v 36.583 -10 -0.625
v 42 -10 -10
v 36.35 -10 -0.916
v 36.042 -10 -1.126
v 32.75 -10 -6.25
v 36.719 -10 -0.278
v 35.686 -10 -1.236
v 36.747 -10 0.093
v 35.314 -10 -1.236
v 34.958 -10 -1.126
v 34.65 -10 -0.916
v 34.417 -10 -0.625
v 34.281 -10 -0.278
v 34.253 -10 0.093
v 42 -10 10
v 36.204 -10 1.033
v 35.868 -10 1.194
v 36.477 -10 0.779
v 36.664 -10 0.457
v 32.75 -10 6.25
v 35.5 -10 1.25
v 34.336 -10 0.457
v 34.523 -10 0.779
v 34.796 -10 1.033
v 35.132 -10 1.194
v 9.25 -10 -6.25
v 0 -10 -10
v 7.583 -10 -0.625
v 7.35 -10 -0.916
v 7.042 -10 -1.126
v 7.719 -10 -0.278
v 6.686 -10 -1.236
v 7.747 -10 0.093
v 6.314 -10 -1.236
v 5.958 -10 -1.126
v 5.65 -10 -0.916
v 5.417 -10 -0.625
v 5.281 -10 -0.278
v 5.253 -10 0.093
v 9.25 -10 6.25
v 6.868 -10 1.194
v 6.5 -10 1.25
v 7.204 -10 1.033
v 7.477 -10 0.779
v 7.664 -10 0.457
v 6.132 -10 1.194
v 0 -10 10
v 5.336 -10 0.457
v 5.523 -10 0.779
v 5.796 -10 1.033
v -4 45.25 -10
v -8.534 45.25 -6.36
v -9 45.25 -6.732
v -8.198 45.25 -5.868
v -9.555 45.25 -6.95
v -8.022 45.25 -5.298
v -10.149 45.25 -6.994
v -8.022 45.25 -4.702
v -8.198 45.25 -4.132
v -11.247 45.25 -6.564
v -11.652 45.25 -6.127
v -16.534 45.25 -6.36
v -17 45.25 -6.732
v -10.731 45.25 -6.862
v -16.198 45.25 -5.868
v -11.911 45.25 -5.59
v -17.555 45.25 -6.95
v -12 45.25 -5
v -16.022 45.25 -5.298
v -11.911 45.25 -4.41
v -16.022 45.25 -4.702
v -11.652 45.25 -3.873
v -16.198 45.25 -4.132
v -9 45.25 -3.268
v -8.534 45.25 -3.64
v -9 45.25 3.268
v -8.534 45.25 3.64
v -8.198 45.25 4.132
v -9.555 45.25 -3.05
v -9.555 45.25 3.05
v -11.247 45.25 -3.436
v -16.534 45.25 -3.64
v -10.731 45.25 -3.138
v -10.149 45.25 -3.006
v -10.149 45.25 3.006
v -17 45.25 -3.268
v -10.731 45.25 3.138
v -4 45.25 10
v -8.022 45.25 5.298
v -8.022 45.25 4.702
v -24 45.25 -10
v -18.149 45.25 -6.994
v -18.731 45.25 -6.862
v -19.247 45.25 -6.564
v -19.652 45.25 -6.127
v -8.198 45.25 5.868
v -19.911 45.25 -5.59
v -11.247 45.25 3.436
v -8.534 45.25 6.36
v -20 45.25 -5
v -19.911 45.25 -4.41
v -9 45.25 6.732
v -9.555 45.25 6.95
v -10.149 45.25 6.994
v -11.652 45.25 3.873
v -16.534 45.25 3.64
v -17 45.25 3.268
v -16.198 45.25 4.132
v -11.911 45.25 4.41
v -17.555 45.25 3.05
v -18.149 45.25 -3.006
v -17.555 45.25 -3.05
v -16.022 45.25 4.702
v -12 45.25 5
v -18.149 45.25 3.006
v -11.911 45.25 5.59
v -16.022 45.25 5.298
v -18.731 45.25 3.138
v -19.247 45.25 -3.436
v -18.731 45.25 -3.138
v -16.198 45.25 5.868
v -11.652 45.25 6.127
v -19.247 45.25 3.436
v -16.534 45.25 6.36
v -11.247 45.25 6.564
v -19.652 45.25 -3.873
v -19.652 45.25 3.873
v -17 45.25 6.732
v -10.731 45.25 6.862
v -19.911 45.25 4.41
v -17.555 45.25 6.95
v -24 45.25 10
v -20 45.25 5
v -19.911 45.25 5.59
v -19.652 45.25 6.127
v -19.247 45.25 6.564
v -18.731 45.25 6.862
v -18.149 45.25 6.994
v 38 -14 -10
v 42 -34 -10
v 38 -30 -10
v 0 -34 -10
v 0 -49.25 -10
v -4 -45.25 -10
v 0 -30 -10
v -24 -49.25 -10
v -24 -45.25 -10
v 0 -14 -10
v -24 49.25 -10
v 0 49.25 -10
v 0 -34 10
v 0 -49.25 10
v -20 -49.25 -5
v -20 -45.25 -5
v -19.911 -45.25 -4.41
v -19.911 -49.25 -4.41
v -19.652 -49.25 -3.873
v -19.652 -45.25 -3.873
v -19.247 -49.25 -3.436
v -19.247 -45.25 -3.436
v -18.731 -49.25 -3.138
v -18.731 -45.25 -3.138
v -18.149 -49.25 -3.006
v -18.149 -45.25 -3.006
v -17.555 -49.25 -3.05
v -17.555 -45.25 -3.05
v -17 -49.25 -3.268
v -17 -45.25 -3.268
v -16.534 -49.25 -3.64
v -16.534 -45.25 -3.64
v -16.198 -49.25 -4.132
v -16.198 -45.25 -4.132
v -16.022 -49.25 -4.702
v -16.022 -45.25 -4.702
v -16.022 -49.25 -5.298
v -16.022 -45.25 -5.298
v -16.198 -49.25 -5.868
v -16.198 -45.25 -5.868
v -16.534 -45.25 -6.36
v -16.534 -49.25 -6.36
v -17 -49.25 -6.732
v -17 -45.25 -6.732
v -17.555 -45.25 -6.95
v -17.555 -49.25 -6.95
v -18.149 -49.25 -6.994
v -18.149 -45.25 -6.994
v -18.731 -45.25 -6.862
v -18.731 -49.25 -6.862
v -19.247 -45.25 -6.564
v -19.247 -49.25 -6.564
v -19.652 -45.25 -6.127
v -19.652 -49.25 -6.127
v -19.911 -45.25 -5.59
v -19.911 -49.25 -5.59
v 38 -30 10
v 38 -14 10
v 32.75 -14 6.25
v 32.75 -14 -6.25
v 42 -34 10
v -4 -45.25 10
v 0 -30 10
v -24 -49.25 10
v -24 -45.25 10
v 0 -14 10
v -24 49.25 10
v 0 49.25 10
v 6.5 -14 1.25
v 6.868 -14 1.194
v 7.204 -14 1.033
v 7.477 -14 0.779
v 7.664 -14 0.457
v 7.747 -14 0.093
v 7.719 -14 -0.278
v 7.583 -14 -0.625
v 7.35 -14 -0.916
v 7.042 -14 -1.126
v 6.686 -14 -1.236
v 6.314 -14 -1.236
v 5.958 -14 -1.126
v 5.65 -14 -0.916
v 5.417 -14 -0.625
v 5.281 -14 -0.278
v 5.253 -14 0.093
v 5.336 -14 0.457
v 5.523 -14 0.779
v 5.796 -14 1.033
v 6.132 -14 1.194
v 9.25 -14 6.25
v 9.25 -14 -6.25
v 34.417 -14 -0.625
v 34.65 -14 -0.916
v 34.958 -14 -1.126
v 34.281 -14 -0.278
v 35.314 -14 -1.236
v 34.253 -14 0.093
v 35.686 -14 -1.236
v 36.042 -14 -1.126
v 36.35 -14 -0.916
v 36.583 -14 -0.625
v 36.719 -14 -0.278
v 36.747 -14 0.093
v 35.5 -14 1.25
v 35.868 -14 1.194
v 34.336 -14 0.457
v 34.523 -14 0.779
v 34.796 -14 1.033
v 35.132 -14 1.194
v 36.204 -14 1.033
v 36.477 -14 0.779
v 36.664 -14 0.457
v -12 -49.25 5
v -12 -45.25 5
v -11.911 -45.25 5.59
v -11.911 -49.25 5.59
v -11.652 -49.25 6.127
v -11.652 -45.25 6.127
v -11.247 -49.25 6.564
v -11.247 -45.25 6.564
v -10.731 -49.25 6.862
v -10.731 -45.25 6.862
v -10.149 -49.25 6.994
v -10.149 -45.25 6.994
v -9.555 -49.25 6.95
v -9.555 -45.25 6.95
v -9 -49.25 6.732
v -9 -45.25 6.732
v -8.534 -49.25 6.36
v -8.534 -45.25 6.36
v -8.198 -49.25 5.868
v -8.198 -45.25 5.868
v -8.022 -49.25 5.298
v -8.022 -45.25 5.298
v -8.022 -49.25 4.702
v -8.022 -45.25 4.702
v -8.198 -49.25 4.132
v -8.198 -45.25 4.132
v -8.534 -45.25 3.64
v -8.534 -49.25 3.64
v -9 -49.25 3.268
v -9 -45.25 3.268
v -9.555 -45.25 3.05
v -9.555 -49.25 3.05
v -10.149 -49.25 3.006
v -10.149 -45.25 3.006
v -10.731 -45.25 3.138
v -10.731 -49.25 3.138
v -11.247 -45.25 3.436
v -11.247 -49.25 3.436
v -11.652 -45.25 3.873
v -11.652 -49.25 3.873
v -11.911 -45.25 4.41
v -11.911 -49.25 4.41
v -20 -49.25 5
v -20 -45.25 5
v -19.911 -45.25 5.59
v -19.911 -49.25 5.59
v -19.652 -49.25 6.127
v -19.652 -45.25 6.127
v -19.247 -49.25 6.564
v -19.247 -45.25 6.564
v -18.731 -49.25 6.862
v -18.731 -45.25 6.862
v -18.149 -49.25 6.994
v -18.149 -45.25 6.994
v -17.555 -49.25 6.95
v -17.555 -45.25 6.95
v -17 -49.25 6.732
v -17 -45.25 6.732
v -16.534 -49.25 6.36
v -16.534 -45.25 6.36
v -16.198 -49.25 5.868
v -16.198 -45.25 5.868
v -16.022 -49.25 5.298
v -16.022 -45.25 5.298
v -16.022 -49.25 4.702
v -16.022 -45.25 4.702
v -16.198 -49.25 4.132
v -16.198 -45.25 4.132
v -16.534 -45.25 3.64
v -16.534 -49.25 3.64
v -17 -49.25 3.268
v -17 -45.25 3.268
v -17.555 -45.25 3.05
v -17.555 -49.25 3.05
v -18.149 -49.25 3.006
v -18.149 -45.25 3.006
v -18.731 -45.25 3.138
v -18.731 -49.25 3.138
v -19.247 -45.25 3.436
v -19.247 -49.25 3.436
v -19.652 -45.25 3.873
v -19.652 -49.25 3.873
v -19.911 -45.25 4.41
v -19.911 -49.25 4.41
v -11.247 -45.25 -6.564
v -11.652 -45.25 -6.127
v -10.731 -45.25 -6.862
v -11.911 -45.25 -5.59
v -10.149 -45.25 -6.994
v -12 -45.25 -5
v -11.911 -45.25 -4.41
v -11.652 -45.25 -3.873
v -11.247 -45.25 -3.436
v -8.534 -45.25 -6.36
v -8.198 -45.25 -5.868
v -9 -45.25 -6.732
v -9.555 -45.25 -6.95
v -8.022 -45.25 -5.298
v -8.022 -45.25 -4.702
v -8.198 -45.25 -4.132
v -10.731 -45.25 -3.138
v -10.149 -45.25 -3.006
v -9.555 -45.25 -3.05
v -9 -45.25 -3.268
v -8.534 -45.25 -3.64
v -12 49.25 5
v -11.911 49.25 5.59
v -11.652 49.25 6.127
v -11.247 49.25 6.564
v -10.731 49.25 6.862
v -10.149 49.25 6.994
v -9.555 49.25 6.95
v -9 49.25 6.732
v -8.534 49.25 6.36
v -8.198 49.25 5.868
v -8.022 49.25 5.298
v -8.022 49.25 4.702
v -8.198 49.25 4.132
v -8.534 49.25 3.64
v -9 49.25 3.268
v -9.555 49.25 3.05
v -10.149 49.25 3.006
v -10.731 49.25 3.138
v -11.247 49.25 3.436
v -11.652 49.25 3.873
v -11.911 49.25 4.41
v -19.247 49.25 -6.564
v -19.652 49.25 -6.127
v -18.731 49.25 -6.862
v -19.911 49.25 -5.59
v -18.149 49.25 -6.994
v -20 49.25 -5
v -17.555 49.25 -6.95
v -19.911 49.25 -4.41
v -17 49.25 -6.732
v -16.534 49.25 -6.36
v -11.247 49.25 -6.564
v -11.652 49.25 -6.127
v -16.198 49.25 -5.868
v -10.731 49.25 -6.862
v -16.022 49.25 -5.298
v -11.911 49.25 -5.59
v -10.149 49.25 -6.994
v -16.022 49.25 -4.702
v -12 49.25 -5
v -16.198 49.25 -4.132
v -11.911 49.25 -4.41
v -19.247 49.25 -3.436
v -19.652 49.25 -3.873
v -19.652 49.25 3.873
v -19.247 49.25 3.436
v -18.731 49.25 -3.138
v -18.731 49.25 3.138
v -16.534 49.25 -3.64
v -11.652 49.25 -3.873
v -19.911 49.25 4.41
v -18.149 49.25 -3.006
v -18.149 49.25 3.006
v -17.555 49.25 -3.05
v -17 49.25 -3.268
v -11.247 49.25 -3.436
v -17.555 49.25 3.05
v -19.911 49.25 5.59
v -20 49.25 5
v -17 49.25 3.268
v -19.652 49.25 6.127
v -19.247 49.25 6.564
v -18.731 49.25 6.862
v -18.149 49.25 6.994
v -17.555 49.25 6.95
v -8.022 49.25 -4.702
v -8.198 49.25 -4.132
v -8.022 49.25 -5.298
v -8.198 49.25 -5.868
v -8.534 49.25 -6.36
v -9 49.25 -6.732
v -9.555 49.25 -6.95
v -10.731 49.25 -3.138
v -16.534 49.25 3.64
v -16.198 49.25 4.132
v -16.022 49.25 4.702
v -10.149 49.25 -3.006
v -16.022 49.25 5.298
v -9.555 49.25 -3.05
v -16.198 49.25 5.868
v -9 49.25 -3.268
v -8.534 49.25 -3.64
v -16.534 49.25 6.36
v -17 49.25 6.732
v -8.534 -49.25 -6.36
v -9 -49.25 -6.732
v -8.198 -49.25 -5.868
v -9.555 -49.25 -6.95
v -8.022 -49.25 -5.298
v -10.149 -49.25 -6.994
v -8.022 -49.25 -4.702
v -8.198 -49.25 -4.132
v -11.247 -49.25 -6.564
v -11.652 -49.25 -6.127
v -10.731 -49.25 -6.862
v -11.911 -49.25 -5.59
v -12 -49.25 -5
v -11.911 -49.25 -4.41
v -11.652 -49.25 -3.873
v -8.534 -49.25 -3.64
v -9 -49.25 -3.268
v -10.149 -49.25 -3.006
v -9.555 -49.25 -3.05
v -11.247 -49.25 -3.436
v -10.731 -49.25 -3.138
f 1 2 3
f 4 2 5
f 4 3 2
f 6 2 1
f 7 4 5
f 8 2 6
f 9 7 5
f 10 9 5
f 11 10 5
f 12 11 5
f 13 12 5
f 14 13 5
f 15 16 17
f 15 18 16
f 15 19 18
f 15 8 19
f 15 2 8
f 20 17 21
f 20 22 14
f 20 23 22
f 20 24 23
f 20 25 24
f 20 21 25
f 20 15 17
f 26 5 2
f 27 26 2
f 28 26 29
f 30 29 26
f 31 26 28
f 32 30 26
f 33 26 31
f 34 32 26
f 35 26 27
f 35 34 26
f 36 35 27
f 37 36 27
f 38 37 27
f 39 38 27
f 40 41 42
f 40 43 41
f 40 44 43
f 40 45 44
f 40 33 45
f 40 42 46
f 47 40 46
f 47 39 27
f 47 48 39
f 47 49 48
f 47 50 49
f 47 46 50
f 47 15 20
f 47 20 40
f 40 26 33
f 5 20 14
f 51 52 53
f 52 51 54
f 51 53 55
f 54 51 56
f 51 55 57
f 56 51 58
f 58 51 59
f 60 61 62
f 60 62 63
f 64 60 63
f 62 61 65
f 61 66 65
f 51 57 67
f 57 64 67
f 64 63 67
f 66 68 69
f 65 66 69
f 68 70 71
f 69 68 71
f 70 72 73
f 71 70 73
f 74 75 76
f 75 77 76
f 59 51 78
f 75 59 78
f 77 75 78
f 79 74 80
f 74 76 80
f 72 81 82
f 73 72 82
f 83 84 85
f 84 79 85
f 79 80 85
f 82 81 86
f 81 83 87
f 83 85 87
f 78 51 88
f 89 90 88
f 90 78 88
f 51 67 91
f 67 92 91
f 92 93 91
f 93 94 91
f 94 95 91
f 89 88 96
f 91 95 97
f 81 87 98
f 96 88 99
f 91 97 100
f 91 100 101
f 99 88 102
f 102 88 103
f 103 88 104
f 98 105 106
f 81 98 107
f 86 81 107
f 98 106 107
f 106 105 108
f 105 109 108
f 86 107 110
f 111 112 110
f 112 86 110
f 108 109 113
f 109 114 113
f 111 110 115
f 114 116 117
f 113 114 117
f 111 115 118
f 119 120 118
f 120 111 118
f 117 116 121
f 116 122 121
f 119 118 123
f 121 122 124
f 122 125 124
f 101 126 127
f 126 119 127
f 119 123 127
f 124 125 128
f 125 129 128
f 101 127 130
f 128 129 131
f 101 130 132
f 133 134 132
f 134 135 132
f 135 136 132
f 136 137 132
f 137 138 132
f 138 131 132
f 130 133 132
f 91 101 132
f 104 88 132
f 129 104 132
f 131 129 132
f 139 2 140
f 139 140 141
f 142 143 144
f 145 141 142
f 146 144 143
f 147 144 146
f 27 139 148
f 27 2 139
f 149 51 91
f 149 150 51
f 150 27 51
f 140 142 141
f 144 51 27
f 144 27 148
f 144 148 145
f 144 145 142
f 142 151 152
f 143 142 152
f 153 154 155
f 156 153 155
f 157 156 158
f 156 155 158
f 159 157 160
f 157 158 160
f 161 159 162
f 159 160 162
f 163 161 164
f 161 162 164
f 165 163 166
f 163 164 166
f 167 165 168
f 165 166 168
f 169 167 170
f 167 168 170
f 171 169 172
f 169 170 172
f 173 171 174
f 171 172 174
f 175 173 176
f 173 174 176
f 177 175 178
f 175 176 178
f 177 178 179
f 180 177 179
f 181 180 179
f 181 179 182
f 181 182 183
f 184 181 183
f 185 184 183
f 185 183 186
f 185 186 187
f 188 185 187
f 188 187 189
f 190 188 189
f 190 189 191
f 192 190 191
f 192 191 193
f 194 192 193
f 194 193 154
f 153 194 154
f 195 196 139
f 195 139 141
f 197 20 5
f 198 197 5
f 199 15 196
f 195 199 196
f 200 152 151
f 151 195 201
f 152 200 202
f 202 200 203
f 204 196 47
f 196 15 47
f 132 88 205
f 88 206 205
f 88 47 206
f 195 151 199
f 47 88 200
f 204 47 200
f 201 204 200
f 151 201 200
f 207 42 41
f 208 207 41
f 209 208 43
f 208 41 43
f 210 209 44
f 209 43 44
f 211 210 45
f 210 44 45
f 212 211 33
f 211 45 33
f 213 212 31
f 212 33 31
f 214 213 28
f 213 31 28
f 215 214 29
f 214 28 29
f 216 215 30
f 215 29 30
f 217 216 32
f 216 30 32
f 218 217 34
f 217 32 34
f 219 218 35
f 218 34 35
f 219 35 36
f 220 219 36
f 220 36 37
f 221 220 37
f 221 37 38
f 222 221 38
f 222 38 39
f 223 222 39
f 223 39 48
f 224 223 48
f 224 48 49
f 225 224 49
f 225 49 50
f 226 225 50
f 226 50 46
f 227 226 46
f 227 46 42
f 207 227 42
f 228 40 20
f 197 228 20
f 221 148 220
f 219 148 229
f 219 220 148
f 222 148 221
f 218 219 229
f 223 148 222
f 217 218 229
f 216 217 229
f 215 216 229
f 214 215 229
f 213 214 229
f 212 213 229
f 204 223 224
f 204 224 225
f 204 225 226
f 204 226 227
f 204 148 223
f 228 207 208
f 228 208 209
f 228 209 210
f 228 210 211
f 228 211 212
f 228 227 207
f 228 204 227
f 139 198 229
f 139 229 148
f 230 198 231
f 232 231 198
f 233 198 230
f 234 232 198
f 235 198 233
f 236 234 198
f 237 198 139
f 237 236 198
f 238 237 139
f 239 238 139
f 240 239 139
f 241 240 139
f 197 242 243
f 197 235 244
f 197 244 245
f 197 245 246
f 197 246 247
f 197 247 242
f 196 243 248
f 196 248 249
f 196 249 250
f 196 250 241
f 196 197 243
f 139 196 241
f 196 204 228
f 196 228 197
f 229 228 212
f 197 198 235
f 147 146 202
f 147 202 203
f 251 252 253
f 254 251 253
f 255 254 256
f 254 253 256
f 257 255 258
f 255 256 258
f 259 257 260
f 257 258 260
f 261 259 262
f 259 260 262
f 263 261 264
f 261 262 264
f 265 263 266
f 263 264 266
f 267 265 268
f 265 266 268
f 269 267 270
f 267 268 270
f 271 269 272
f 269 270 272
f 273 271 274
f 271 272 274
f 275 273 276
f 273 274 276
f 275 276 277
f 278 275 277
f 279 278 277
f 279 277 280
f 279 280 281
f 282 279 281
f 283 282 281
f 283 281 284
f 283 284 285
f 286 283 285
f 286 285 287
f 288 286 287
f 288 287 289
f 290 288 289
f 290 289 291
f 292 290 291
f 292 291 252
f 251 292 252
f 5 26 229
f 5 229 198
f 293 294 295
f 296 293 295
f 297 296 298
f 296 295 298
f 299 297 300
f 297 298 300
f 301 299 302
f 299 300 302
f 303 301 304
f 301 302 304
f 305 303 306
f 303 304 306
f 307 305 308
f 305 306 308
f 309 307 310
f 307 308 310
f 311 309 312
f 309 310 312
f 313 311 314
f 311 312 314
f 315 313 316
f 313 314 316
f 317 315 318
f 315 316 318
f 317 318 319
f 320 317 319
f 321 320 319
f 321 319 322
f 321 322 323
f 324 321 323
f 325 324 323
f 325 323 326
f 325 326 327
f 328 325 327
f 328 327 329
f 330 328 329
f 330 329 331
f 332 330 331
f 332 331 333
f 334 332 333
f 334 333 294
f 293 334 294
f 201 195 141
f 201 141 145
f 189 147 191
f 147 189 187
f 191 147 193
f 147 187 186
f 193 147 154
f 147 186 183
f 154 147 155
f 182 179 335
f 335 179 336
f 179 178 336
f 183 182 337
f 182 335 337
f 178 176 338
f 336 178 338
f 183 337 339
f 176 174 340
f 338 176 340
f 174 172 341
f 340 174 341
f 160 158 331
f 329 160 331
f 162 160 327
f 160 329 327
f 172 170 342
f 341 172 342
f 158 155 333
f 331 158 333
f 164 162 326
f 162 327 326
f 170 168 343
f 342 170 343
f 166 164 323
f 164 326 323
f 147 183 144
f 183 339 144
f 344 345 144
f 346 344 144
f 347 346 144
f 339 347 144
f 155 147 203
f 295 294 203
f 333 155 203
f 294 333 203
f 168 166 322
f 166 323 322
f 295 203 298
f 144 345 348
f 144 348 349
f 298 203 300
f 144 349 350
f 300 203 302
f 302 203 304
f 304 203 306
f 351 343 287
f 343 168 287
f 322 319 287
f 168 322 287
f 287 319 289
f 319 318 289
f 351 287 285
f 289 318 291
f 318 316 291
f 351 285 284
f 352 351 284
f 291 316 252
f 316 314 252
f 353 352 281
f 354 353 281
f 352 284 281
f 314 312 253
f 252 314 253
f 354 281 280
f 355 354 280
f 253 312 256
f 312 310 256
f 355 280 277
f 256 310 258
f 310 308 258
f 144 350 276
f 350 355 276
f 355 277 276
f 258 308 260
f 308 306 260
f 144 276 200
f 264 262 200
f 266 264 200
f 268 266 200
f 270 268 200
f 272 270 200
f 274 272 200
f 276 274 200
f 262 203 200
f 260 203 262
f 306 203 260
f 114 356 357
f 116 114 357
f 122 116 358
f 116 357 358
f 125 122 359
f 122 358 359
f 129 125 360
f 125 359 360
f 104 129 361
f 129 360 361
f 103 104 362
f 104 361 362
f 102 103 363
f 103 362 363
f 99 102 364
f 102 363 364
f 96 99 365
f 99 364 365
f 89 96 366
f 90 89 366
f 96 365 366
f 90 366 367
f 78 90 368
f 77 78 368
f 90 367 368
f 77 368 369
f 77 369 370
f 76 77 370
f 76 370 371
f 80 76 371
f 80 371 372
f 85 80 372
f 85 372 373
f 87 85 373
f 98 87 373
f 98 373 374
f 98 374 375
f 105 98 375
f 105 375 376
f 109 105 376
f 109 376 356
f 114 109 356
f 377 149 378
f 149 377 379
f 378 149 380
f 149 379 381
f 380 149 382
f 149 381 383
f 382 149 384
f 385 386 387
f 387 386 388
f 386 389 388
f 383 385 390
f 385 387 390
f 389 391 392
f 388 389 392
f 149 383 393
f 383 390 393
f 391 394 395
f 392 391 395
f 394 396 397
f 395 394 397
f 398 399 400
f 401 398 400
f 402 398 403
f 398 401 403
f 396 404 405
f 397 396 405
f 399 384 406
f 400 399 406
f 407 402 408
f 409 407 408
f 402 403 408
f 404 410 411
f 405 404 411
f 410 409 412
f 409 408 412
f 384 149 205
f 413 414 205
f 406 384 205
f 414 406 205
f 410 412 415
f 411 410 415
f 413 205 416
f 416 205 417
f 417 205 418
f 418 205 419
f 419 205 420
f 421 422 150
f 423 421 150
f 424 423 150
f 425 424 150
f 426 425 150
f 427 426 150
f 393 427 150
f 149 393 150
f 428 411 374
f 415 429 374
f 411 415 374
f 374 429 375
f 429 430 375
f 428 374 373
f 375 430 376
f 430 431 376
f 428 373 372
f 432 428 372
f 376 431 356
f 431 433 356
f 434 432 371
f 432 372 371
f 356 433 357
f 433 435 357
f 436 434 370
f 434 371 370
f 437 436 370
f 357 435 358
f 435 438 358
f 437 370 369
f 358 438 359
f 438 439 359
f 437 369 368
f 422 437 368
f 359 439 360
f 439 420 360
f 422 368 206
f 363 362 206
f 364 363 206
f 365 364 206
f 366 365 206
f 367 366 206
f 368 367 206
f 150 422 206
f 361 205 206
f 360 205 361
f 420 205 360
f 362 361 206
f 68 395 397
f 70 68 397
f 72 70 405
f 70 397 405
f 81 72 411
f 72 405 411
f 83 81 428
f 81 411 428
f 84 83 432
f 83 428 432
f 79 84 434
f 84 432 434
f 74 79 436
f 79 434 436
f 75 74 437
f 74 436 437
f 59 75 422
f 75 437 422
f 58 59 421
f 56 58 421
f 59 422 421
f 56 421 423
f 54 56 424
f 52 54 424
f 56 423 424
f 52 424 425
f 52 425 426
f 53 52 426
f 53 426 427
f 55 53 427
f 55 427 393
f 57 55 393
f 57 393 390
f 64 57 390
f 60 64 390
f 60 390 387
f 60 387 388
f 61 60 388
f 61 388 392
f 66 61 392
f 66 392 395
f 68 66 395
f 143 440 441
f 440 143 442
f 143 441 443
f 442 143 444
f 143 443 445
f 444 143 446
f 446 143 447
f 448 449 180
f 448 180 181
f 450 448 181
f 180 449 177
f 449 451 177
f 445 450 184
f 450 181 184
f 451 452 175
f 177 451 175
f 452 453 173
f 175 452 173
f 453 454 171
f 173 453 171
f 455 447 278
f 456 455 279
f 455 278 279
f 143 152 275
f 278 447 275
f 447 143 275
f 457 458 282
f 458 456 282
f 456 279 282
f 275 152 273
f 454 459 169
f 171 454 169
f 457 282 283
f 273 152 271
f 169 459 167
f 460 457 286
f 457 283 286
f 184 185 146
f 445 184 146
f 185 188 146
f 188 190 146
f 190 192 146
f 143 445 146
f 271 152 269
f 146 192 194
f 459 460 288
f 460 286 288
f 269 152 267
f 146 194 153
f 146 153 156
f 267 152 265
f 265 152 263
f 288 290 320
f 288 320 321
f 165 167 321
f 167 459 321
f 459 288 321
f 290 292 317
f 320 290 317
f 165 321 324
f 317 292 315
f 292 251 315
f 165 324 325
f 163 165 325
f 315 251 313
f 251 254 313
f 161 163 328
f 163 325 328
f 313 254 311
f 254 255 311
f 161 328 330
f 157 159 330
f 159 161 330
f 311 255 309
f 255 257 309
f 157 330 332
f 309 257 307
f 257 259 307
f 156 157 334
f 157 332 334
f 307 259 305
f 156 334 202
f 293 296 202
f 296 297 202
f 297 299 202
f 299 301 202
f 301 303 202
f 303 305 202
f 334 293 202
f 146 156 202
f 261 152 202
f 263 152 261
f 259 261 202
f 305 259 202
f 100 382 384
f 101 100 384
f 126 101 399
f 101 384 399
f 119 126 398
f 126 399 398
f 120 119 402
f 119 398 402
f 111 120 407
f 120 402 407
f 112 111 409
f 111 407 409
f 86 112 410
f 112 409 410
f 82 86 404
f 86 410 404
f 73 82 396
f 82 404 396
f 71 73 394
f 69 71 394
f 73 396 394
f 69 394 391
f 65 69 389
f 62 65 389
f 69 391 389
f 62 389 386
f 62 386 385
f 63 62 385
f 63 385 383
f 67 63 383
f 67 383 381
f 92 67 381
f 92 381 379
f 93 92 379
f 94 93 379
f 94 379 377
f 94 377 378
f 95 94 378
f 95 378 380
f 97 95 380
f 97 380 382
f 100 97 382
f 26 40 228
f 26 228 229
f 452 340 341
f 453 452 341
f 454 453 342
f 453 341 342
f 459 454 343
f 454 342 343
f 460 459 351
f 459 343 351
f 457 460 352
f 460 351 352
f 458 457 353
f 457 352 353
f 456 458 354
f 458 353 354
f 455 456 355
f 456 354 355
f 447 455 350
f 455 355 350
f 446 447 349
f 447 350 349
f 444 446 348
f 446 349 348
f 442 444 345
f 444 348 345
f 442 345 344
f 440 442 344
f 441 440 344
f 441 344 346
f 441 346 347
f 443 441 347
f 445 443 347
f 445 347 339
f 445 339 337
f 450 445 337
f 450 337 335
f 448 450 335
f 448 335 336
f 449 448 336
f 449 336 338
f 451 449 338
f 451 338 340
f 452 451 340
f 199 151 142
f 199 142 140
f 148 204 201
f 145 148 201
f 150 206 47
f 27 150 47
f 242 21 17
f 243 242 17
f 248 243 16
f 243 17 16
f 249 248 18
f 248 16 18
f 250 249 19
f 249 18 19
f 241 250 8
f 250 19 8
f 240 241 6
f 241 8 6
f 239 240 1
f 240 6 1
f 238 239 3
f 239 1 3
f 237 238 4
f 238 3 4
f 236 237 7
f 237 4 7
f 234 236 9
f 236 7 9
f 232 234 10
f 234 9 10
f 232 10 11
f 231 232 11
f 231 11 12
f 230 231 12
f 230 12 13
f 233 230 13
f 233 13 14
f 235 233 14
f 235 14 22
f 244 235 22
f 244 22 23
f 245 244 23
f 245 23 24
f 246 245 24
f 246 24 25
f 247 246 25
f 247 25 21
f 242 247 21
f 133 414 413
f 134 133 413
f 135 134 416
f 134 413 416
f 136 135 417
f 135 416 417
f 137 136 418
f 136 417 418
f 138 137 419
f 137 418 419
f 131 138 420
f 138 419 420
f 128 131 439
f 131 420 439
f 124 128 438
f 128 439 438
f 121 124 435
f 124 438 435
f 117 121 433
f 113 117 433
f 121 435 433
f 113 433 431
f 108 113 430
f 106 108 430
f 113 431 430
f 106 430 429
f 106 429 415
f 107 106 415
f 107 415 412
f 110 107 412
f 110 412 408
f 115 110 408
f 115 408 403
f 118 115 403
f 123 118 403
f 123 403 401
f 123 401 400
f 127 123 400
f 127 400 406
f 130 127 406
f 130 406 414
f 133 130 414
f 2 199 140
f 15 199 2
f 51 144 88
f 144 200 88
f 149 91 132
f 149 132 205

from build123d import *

# Parameters (mm, degrees)
BOSS_EXTRUDE1_DEPTH = 10
BOSS_EXTRUDE2_DEPTH = 20
SKETCH3_W           = 23.5
SKETCH3_H           = 12.5
CUT_EXTRUDE1_DEPTH  = 5
SKETCH4_R           = 1.25
CUT_EXTRUDE2_DEPTH  = 5
SKETCH5_R           = 2
CUT_EXTRUDE3_DEPTH  = 108.54650157


with BuildPart() as part:
    # Sketch1 → Boss-Extrude1 (new, symmetric)
    with BuildSketch(Plane.XY):
        Polygon((-24, 49.25), (0, 49.25), (0, -49.25), (-24, -49.25), (-24, -45.25), (-4, -45.25), (-4, 45.25), (-24, 45.25), align=None)
    extrude(amount=BOSS_EXTRUDE1_DEPTH, both=True)

    # Sketch2 → Boss-Extrude2 (add)
    with BuildSketch(Plane.XY.offset(10)):
        Polygon((0, -14), (38, -14), (38, -30), (0, -30), (0, -34), (42, -34), (42, -10), (0, -10), align=None)
    extrude(amount=-BOSS_EXTRUDE2_DEPTH)

    # Sketch3 → Cut-Extrude1 (cut)
    with BuildSketch(Plane(origin=(0, -10, 0), x_dir=(1, 0, 0), z_dir=(0, 1, 0))):
        with Locations((21, 0)):
            Rectangle(SKETCH3_W, SKETCH3_H)
    extrude(amount=-CUT_EXTRUDE1_DEPTH, mode=Mode.SUBTRACT)

    # Sketch4 → Cut-Extrude2 (cut)
    with BuildSketch(Plane(origin=(0, -10, 0), x_dir=(1, 0, 0), z_dir=(0, 1, 0))):
        with Locations(Location((35.5, 0, 0), (0, 0, 270))):
            Circle(SKETCH4_R)
        with Locations(Location((6.5, 0, 0), (0, 0, 270))):
            Circle(SKETCH4_R)
    extrude(amount=-CUT_EXTRUDE2_DEPTH, mode=Mode.SUBTRACT)

    # Sketch5 → Cut-Extrude3 (cut, through all)
    with BuildSketch(Plane(origin=(0, 49.25, 0), x_dir=(1, 0, 0), z_dir=(0, 1, 0))):
        with Locations(Location((-18, 5, 0), (0, 0, 180))):
            Circle(SKETCH5_R)
        with Locations(Location((-18, -5, 0), (0, 0, 180))):
            Circle(SKETCH5_R)
        with Locations(Location((-10, -5, 0), (0, 0, 180))):
            Circle(SKETCH5_R)
        with Locations(Location((-10, 5, 0), (0, 0, 180))):
            Circle(SKETCH5_R)
    extrude(amount=-CUT_EXTRUDE3_DEPTH, mode=Mode.SUBTRACT)


solid = part.part
